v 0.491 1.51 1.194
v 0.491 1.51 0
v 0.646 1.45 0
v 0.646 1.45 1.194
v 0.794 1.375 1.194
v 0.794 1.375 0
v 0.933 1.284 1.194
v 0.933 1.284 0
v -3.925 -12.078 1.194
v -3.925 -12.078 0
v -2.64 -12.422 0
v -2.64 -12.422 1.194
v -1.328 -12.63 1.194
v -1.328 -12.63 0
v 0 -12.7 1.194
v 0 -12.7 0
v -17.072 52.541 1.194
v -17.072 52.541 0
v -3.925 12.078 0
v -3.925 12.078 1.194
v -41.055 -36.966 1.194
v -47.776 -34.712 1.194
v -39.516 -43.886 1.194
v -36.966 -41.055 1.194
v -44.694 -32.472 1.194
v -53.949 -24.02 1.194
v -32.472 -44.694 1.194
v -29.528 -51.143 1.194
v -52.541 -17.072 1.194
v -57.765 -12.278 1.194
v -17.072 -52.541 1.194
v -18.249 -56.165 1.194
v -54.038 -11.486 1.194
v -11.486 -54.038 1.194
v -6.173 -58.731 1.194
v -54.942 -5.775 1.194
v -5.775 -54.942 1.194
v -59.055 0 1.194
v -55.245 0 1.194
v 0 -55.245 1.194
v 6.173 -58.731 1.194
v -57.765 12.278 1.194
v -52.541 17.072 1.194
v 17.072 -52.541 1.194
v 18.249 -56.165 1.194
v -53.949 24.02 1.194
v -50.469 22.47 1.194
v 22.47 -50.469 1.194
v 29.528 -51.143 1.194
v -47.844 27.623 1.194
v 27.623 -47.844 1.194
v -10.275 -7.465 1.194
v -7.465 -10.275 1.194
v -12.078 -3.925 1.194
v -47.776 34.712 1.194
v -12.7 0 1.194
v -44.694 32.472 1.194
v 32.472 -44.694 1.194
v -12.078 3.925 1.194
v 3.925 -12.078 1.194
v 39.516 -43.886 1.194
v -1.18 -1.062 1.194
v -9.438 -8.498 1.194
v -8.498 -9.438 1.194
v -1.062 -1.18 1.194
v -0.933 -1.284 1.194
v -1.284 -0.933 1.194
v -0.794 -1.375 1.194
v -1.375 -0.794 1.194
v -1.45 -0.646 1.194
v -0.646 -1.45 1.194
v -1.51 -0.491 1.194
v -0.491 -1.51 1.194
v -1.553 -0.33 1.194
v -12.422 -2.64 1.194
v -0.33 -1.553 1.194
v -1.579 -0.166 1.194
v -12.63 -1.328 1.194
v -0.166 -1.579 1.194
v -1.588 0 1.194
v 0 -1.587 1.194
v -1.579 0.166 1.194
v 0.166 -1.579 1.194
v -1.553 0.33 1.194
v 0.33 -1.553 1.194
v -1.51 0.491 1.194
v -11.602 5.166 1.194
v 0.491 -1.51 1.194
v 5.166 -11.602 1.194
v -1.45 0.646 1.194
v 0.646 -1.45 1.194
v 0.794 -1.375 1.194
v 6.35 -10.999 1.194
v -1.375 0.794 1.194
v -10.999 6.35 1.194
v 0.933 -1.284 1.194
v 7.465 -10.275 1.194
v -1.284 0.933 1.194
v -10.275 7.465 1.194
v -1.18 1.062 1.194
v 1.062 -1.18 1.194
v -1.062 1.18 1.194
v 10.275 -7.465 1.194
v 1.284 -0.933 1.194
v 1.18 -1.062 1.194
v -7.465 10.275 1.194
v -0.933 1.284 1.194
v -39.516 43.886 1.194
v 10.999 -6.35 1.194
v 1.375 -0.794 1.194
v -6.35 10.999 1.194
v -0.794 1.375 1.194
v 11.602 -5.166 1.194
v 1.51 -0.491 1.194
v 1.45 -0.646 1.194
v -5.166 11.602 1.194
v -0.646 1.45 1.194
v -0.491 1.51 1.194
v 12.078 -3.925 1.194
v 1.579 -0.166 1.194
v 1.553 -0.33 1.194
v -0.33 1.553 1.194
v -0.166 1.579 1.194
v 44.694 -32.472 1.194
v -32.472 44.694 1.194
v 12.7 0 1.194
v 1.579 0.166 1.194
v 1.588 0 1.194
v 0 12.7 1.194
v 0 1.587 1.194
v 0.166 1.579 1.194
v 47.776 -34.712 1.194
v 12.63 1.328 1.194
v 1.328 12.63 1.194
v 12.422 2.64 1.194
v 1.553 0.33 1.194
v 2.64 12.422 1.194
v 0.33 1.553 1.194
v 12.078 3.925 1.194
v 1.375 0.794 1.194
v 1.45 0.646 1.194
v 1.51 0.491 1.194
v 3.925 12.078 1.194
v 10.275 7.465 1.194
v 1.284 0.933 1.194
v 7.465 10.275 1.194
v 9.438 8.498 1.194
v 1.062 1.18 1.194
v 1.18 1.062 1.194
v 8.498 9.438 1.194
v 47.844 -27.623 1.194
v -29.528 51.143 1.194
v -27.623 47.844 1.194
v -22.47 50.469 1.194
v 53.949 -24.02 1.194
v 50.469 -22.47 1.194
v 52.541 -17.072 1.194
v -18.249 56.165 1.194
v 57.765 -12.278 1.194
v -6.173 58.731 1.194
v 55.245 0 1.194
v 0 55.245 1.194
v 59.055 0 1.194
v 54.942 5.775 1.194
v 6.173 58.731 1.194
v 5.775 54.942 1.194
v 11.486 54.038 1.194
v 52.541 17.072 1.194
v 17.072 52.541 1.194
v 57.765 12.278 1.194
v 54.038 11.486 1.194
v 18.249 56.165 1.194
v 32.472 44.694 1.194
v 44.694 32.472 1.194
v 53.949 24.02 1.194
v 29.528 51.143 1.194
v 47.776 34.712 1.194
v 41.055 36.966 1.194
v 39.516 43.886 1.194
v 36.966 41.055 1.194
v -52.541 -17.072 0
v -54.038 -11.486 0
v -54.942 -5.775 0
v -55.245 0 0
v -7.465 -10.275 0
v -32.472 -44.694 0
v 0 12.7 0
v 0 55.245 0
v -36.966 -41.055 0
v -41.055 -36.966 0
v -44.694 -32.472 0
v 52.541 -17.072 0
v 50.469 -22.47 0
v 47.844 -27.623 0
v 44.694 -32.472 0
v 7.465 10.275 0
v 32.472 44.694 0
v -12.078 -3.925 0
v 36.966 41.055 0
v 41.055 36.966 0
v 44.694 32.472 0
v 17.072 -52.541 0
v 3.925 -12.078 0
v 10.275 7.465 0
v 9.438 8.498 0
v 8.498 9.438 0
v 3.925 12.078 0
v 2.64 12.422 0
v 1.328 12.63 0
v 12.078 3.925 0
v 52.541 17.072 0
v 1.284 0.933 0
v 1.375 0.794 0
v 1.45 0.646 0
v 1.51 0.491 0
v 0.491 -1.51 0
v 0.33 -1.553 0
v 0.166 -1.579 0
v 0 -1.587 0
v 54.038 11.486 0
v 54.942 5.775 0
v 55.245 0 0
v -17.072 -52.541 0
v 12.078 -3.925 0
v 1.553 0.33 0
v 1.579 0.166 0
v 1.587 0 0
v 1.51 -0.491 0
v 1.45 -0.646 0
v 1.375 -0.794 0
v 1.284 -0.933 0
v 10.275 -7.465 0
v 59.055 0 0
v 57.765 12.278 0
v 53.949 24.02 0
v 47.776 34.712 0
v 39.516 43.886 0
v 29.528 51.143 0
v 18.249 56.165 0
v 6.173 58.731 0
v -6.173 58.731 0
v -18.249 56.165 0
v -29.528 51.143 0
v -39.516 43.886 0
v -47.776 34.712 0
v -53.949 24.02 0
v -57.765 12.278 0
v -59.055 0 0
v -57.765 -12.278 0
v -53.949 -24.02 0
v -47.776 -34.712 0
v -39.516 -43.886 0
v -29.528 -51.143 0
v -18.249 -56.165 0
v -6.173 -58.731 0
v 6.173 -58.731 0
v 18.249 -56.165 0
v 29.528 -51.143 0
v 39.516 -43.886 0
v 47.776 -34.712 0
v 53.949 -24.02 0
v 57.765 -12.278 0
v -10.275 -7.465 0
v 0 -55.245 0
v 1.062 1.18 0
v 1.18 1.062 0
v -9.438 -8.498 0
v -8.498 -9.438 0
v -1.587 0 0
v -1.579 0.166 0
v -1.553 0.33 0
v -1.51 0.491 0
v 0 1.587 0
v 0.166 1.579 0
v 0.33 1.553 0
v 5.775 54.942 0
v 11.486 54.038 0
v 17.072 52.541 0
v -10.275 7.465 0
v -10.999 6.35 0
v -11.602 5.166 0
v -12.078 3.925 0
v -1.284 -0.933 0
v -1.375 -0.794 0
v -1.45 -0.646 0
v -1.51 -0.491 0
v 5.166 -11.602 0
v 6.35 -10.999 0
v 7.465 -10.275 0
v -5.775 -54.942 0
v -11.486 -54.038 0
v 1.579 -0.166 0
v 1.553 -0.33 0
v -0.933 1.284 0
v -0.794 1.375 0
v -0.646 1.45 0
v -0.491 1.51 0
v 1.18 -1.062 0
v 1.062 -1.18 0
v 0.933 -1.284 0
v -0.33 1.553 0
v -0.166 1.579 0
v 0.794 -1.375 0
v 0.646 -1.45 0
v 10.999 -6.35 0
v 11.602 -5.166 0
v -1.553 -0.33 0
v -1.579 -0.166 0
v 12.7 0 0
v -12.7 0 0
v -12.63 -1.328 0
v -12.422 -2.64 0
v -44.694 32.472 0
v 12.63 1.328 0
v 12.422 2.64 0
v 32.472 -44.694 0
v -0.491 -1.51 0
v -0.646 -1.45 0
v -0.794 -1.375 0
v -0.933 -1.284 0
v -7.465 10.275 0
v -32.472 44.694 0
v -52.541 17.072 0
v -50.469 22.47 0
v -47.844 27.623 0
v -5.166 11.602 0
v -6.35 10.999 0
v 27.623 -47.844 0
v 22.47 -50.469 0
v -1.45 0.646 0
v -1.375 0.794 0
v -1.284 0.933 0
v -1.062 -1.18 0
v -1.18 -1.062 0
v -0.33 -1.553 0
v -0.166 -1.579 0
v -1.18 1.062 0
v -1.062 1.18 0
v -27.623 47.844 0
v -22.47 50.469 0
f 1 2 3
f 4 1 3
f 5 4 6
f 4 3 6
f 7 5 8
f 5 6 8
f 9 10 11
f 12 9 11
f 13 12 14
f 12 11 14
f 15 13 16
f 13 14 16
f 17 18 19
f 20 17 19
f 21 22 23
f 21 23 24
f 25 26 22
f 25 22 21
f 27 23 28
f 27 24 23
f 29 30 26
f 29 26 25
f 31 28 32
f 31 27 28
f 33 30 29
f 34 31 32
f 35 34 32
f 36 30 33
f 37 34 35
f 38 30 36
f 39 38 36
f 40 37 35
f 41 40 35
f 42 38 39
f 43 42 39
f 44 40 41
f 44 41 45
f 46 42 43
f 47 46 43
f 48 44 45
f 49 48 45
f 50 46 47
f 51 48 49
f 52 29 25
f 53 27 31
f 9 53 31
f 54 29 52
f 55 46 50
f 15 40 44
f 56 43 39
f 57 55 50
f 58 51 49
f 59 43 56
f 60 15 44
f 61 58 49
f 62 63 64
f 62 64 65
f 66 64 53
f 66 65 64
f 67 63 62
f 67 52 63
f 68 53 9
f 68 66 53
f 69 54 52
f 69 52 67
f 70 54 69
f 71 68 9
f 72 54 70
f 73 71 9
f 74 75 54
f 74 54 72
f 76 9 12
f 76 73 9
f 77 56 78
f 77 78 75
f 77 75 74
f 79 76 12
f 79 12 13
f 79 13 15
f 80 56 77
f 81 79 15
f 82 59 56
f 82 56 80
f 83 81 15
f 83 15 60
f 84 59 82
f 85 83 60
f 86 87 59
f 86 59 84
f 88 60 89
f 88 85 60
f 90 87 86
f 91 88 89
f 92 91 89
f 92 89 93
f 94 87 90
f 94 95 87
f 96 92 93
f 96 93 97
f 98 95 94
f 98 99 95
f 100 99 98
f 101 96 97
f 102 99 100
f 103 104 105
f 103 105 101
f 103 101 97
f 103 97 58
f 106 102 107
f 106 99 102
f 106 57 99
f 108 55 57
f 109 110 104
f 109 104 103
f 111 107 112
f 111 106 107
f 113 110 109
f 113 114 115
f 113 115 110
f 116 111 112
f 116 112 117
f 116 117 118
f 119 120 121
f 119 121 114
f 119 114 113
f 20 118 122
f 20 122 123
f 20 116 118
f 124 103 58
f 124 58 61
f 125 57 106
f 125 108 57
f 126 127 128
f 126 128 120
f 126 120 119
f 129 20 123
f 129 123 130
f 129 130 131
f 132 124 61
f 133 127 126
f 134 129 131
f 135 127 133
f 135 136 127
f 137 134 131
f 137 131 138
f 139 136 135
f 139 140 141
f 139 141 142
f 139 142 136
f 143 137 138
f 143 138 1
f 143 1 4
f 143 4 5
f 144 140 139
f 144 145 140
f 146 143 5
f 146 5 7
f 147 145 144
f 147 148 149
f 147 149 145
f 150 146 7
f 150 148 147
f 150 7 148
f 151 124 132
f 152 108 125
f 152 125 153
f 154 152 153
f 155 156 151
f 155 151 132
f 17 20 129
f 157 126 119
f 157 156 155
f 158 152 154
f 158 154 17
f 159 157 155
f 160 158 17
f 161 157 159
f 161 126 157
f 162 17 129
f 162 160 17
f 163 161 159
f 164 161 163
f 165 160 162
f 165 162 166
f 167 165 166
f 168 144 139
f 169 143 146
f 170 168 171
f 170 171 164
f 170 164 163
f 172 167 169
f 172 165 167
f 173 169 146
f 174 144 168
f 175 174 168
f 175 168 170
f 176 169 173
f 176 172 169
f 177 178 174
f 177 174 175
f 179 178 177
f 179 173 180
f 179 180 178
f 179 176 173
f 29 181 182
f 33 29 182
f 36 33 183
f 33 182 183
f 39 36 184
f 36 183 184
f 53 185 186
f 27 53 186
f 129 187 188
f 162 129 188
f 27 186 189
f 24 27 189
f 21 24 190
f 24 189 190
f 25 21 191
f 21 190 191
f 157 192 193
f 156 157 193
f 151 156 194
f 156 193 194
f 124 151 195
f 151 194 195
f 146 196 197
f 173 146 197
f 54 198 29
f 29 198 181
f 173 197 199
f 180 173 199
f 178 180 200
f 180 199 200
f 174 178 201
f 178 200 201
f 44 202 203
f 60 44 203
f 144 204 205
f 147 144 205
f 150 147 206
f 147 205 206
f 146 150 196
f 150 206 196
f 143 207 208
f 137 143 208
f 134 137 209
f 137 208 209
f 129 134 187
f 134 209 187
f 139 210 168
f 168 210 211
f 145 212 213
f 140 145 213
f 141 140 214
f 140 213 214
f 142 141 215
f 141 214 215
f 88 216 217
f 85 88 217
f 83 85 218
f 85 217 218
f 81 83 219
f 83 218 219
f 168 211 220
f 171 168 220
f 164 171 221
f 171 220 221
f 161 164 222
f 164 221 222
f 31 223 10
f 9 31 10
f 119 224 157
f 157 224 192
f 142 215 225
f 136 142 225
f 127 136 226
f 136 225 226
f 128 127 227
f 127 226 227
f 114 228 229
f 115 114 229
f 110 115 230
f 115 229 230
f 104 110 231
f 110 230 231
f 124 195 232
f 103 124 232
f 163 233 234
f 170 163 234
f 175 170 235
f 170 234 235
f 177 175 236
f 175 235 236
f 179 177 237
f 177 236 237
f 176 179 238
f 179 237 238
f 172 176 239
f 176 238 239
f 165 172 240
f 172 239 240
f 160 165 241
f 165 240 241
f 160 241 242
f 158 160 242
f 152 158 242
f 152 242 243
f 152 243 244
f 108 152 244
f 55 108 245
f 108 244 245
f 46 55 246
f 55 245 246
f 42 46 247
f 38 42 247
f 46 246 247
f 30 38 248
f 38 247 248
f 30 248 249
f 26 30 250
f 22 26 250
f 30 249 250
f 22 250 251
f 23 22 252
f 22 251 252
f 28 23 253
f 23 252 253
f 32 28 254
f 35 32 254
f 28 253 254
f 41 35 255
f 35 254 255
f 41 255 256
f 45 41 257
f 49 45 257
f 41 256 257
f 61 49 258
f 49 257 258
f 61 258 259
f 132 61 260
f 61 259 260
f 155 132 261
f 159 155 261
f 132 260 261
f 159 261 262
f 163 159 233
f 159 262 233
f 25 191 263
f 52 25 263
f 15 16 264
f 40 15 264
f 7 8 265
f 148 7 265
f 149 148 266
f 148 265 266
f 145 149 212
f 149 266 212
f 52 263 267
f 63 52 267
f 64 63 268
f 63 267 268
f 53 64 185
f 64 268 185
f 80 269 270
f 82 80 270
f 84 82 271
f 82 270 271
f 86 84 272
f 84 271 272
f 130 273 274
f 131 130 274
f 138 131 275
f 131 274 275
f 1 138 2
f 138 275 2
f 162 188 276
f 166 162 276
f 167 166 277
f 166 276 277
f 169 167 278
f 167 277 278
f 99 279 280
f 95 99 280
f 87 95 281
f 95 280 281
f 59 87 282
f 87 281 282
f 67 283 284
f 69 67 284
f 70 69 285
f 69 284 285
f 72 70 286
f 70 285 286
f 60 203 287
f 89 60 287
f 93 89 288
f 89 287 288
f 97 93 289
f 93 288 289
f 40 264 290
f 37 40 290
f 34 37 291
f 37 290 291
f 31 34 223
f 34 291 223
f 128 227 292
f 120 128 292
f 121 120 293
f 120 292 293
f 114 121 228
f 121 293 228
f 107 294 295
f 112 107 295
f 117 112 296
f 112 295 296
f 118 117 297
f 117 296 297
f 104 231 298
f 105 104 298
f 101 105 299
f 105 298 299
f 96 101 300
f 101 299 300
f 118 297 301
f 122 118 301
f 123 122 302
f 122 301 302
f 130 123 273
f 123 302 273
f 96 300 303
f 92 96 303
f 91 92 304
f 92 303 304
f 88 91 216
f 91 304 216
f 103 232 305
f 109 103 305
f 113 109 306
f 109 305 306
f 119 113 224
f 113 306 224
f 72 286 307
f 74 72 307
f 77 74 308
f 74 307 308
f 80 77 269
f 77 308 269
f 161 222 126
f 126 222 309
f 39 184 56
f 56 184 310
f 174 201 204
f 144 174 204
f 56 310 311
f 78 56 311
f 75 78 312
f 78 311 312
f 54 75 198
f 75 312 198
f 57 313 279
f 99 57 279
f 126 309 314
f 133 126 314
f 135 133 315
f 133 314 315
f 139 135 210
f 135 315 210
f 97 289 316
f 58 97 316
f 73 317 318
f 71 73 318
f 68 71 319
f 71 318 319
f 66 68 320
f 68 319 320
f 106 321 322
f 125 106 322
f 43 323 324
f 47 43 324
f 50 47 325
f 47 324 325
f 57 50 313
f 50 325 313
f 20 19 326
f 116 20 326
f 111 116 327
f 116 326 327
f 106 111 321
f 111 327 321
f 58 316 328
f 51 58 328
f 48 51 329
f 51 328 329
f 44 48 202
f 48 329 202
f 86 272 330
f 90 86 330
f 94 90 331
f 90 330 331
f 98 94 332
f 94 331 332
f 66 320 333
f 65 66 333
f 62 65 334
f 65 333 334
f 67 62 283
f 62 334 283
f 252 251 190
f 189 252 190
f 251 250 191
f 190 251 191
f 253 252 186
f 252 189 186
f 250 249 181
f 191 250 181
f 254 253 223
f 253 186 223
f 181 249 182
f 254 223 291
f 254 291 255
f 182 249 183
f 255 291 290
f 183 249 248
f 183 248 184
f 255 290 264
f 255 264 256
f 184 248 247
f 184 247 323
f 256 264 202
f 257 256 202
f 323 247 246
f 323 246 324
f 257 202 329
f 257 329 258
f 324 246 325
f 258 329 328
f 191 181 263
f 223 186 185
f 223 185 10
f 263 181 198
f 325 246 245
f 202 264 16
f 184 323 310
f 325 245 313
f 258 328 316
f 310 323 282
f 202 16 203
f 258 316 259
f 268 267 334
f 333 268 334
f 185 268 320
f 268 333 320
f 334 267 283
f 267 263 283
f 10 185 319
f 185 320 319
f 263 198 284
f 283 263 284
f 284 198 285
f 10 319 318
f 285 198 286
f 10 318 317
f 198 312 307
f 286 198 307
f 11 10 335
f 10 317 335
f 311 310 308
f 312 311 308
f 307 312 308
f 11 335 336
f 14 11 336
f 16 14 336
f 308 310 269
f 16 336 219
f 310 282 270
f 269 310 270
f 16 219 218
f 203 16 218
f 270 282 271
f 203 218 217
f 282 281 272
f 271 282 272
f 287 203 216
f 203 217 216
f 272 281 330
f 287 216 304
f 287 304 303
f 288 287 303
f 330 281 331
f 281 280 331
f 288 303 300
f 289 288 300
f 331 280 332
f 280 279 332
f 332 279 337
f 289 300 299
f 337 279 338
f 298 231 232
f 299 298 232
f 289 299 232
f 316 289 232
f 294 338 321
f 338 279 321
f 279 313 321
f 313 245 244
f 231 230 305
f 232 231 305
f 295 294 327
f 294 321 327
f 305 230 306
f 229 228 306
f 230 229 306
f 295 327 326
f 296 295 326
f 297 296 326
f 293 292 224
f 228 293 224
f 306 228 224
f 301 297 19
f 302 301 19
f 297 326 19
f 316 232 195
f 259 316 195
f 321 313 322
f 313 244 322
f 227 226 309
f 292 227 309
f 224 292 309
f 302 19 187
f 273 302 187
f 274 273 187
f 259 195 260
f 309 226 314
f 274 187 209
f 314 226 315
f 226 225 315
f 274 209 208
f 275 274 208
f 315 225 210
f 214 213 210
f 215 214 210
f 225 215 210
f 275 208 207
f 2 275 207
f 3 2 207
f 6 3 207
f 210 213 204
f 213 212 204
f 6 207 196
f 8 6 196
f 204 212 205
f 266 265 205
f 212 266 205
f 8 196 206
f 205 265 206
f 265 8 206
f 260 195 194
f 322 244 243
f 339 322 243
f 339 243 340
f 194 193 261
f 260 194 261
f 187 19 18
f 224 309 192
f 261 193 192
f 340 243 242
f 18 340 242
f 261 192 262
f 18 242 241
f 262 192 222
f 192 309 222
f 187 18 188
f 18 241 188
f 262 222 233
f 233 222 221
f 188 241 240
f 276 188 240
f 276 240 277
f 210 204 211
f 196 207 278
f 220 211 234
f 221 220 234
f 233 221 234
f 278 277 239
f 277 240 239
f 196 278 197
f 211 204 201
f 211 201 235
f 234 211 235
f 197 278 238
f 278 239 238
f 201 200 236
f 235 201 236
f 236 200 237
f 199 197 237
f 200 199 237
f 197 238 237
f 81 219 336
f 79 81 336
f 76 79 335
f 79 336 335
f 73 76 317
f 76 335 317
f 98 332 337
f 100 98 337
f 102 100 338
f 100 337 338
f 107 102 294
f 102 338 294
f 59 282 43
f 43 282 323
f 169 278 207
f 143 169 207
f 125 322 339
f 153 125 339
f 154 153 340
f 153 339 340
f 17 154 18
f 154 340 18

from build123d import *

# Parameters (mm, degrees)
F0_R     = 59.055
F1_DEPTH = 1.1938
F2_DEPTH = 1.1938


with BuildPart() as f1:
    # F0 (on Top) → F1 (new body)
    with BuildSketch(Plane.XY):
        Circle(F0_R)
        with BuildLine():
            ThreePointArc((52.5411172427, 17.0716438542), (54.5648423762, 8.6422220211), (55.245, 0))
            ThreePointArc((55.245, 0), (54.5648423762, -8.6422220211), (52.5411172427, -17.0716438542))
            ThreePointArc((52.5411172427, -17.0716438542), (49.2236554288, -25.0807051581), (44.6941438542, -32.4721962629))
            ThreePointArc((44.6941438542, -32.4721962629), (39.0641141267, -39.0641141267), (32.4721962629, -44.6941438542))
            ThreePointArc((32.4721962629, -44.6941438542), (25.0807051581, -49.2236554288), (17.0716438542, -52.5411172427))
            ThreePointArc((17.0716438542, -52.5411172427), (8.6422220211, -54.5648423762), (0, -55.245))
            ThreePointArc((0, -55.245), (-8.6422220211, -54.5648423762), (-17.0716438542, -52.5411172427))
            ThreePointArc((-17.0716438542, -52.5411172427), (-25.0807051581, -49.2236554288), (-32.4721962629, -44.6941438542))
            ThreePointArc((-32.4721962629, -44.6941438542), (-39.0641141267, -39.0641141267), (-44.6941438542, -32.4721962629))
            ThreePointArc((-44.6941438542, -32.4721962629), (-49.2236554288, -25.0807051581), (-52.5411172427, -17.0716438542))
            ThreePointArc((-52.5411172427, -17.0716438542), (-54.5648423762, -8.6422220211), (-55.245, 0))
            ThreePointArc((-55.245, 0), (-54.5648423762, 8.6422220211), (-52.5411172427, 17.0716438542))
            ThreePointArc((-52.5411172427, 17.0716438542), (-49.2236554288, 25.0807051581), (-44.6941438542, 32.4721962629))
            ThreePointArc((-44.6941438542, 32.4721962629), (-39.0641141267, 39.0641141267), (-32.4721962629, 44.6941438542))
            ThreePointArc((-32.4721962629, 44.6941438542), (-25.0807051581, 49.2236554288), (-17.0716438542, 52.5411172427))
            ThreePointArc((-17.0716438542, 52.5411172427), (-8.6422220211, 54.5648423762), (0, 55.245))
            ThreePointArc((0, 55.245), (8.6422220211, 54.5648423762), (17.0716438542, 52.5411172427))
            ThreePointArc((17.0716438542, 52.5411172427), (25.0807051581, 49.2236554288), (32.4721962629, 44.6941438542))
            ThreePointArc((32.4721962629, 44.6941438542), (39.0641141267, 39.0641141267), (44.6941438542, 32.4721962629))
            ThreePointArc((44.6941438542, 32.4721962629), (49.2236554288, 25.0807051581), (52.5411172427, 17.0716438542))
        make_face(mode=Mode.SUBTRACT)
        with BuildLine():
            ThreePointArc((0, -55.245), (8.6422220211, -54.5648423762), (17.0716438542, -52.5411172427))
            Line((17.0716438542, -52.5411172427), (3.9245158286, -12.0784177569))
            ThreePointArc((3.9245158286, -12.0784177569), (1.986717706, -12.5436419256), (0, -12.7))
            Line((0, -12.7), (0, -55.245))
        make_face()
        with BuildLine():
            ThreePointArc((-3.9245158286, -12.0784177569), (-5.7656793467, -11.3157828572), (-7.4648727041, -10.2745158286))
            Line((-7.4648727041, -10.2745158286), (-32.4721962629, -44.6941438542))
            ThreePointArc((-32.4721962629, -44.6941438542), (-25.0807051581, -49.2236554288), (-17.0716438542, -52.5411172427))
            Line((-17.0716438542, -52.5411172427), (-3.9245158286, -12.0784177569))
        make_face()
        with BuildLine():
            ThreePointArc((-10.2745158286, -7.4648727041), (-11.3157828572, -5.7656793467), (-12.0784177569, -3.9245158286))
            Line((-12.0784177569, -3.9245158286), (-52.5411172427, -17.0716438542))
            ThreePointArc((-52.5411172427, -17.0716438542), (-49.2236554288, -25.0807051581), (-44.6941438542, -32.4721962629))
            Line((-44.6941438542, -32.4721962629), (-10.2745158286, -7.4648727041))
        make_face()
        with BuildLine():
            ThreePointArc((-12.7, 0), (-12.5436419256, 1.986717706), (-12.0784177569, 3.9245158286))
            Line((-12.0784177569, 3.9245158286), (-52.5411172427, 17.0716438542))
            ThreePointArc((-52.5411172427, 17.0716438542), (-54.5648423762, 8.6422220211), (-55.245, 0))
            Line((-55.245, 0), (-12.7, 0))
        make_face()
        with BuildLine():
            ThreePointArc((-10.2745158286, 7.4648727041), (-8.9802561211, 8.9802561211), (-7.4648727041, 10.2745158286))
            Line((-7.4648727041, 10.2745158286), (-32.4721962629, 44.6941438542))
            ThreePointArc((-32.4721962629, 44.6941438542), (-39.0641141267, 39.0641141267), (-44.6941438542, 32.4721962629))
            Line((-44.6941438542, 32.4721962629), (-10.2745158286, 7.4648727041))
        make_face()
        with BuildLine():
            Line((0, 12.7), (0, 55.245))
            ThreePointArc((0, 55.245), (-8.6422220211, 54.5648423762), (-17.0716438542, 52.5411172427))
            Line((-17.0716438542, 52.5411172427), (-3.9245158286, 12.0784177569))
            ThreePointArc((-3.9245158286, 12.0784177569), (-1.986717706, 12.5436419256), (0, 12.7))
        make_face()
        with BuildLine():
            Line((7.4648727041, 10.2745158286), (32.4721962629, 44.6941438542))
            ThreePointArc((32.4721962629, 44.6941438542), (25.0807051581, 49.2236554288), (17.0716438542, 52.5411172427))
            Line((17.0716438542, 52.5411172427), (3.9245158286, 12.0784177569))
            ThreePointArc((3.9245158286, 12.0784177569), (5.7656793467, 11.3157828572), (7.4648727041, 10.2745158286))
        make_face()
        with BuildLine():
            Line((12.0784177569, 3.9245158286), (52.5411172427, 17.0716438542))
            ThreePointArc((52.5411172427, 17.0716438542), (49.2236554288, 25.0807051581), (44.6941438542, 32.4721962629))
            Line((44.6941438542, 32.4721962629), (10.2745158286, 7.4648727041))
            ThreePointArc((10.2745158286, 7.4648727041), (11.3157828572, 5.7656793467), (12.0784177569, 3.9245158286))
        make_face()
        with BuildLine():
            ThreePointArc((52.5411172427, -17.0716438542), (54.5648423762, -8.6422220211), (55.245, 0))
            Line((55.245, 0), (12.7, 0))
            ThreePointArc((12.7, 0), (12.5436419256, -1.986717706), (12.0784177569, -3.9245158286))
            Line((12.0784177569, -3.9245158286), (52.5411172427, -17.0716438542))
        make_face()
        with BuildLine():
            ThreePointArc((32.4721962629, -44.6941438542), (39.0641141267, -39.0641141267), (44.6941438542, -32.4721962629))
            Line((44.6941438542, -32.4721962629), (10.2745158286, -7.4648727041))
            ThreePointArc((10.2745158286, -7.4648727041), (8.9802561211, -8.9802561211), (7.4648727041, -10.2745158286))
            Line((7.4648727041, -10.2745158286), (32.4721962629, -44.6941438542))
        make_face()
        with BuildLine():
            Line((0, 12.7), (0, 1.5875))
            ThreePointArc((0, 1.5875), (0.2483397133, 1.5679552407), (0.4905644786, 1.5098022196))
            Line((0.4905644786, 1.5098022196), (3.9245158286, 12.0784177569))
            ThreePointArc((3.9245158286, 12.0784177569), (1.986717706, 12.5436419256), (0, 12.7))
        make_face()
        with BuildLine():
            ThreePointArc((-0.4905644786, 1.5098022196), (-0.2483397133, 1.5679552407), (0, 1.5875))
            Line((0, 1.5875), (0, 12.7))
            ThreePointArc((0, 12.7), (-1.986717706, 12.5436419256), (-3.9245158286, 12.0784177569))
            Line((-3.9245158286, 12.0784177569), (-0.4905644786, 1.5098022196))
        make_face()
        with BuildLine():
            ThreePointArc((-0.933109088, 1.2843144786), (-0.7207099183, 1.4144728571), (-0.4905644786, 1.5098022196))
            Line((-0.4905644786, 1.5098022196), (-3.9245158286, 12.0784177569))
            ThreePointArc((-3.9245158286, 12.0784177569), (-5.7656793467, 11.3157828572), (-7.4648727041, 10.2745158286))
            Line((-7.4648727041, 10.2745158286), (-0.933109088, 1.2843144786))
        make_face()
        with BuildLine():
            ThreePointArc((-1.2843144786, 0.933109088), (-1.1225320151, 1.1225320151), (-0.933109088, 1.2843144786))
            Line((-0.933109088, 1.2843144786), (-7.4648727041, 10.2745158286))
            ThreePointArc((-7.4648727041, 10.2745158286), (-8.9802561211, 8.9802561211), (-10.2745158286, 7.4648727041))
            Line((-10.2745158286, 7.4648727041), (-1.2843144786, 0.933109088))
        make_face()
        with BuildLine():
            ThreePointArc((-1.5098022196, 0.4905644786), (-1.4144728571, 0.7207099183), (-1.2843144786, 0.933109088))
            Line((-1.2843144786, 0.933109088), (-10.2745158286, 7.4648727041))
            ThreePointArc((-10.2745158286, 7.4648727041), (-11.3157828572, 5.7656793467), (-12.0784177569, 3.9245158286))
            Line((-12.0784177569, 3.9245158286), (-1.5098022196, 0.4905644786))
        make_face()
        with BuildLine():
            ThreePointArc((-1.5875, 0), (-1.5679552407, 0.2483397133), (-1.5098022196, 0.4905644786))
            Line((-1.5098022196, 0.4905644786), (-12.0784177569, 3.9245158286))
            ThreePointArc((-12.0784177569, 3.9245158286), (-12.5436419256, 1.986717706), (-12.7, 0))
            Line((-12.7, 0), (-1.5875, 0))
        make_face()
        with BuildLine():
            ThreePointArc((-1.5098022196, -0.4905644786), (-1.5679552407, -0.2483397133), (-1.5875, 0))
            Line((-1.5875, 0), (-12.7, 0))
            ThreePointArc((-12.7, 0), (-12.5436419256, -1.986717706), (-12.0784177569, -3.9245158286))
            Line((-12.0784177569, -3.9245158286), (-1.5098022196, -0.4905644786))
        make_face()
        with BuildLine():
            ThreePointArc((-1.2843144786, -0.933109088), (-1.4144728571, -0.7207099183), (-1.5098022196, -0.4905644786))
            Line((-1.5098022196, -0.4905644786), (-12.0784177569, -3.9245158286))
            ThreePointArc((-12.0784177569, -3.9245158286), (-11.3157828572, -5.7656793467), (-10.2745158286, -7.4648727041))
            Line((-10.2745158286, -7.4648727041), (-1.2843144786, -0.933109088))
        make_face()
        with BuildLine():
            ThreePointArc((-0.933109088, -1.2843144786), (-1.1225320151, -1.1225320151), (-1.2843144786, -0.933109088))
            Line((-1.2843144786, -0.933109088), (-10.2745158286, -7.4648727041))
            ThreePointArc((-10.2745158286, -7.4648727041), (-8.9802561211, -8.9802561211), (-7.4648727041, -10.2745158286))
            Line((-7.4648727041, -10.2745158286), (-0.933109088, -1.2843144786))
        make_face()
        with BuildLine():
            ThreePointArc((-0.4905644786, -1.5098022196), (-0.7207099183, -1.4144728571), (-0.933109088, -1.2843144786))
            Line((-0.933109088, -1.2843144786), (-7.4648727041, -10.2745158286))
            ThreePointArc((-7.4648727041, -10.2745158286), (-5.7656793467, -11.3157828572), (-3.9245158286, -12.0784177569))
            Line((-3.9245158286, -12.0784177569), (-0.4905644786, -1.5098022196))
        make_face()
        with BuildLine():
            ThreePointArc((0, -1.5875), (-0.2483397133, -1.5679552407), (-0.4905644786, -1.5098022196))
            Line((-0.4905644786, -1.5098022196), (-3.9245158286, -12.0784177569))
            ThreePointArc((-3.9245158286, -12.0784177569), (-1.986717706, -12.5436419256), (0, -12.7))
            Line((0, -12.7), (0, -1.5875))
        make_face()
        with BuildLine():
            ThreePointArc((0.4905644786, -1.5098022196), (0.2483397133, -1.5679552407), (0, -1.5875))
            Line((0, -1.5875), (0, -12.7))
            ThreePointArc((0, -12.7), (1.986717706, -12.5436419256), (3.9245158286, -12.0784177569))
            Line((3.9245158286, -12.0784177569), (0.4905644786, -1.5098022196))
        make_face()
        with BuildLine():
            ThreePointArc((3.9245158286, -12.0784177569), (5.7656793467, -11.3157828572), (7.4648727041, -10.2745158286))
            Line((7.4648727041, -10.2745158286), (0.933109088, -1.2843144786))
            ThreePointArc((0.933109088, -1.2843144786), (0.7207099183, -1.4144728571), (0.4905644786, -1.5098022196))
            Line((0.4905644786, -1.5098022196), (3.9245158286, -12.0784177569))
        make_face()
        with BuildLine():
            ThreePointArc((7.4648727041, -10.2745158286), (8.9802561211, -8.9802561211), (10.2745158286, -7.4648727041))
            Line((10.2745158286, -7.4648727041), (1.2843144786, -0.933109088))
            ThreePointArc((1.2843144786, -0.933109088), (1.1225320151, -1.1225320151), (0.933109088, -1.2843144786))
            Line((0.933109088, -1.2843144786), (7.4648727041, -10.2745158286))
        make_face()
        with BuildLine():
            ThreePointArc((10.2745158286, -7.4648727041), (11.3157828572, -5.7656793467), (12.0784177569, -3.9245158286))
            Line((12.0784177569, -3.9245158286), (1.5098022196, -0.4905644786))
            ThreePointArc((1.5098022196, -0.4905644786), (1.4144728571, -0.7207099183), (1.2843144786, -0.933109088))
            Line((1.2843144786, -0.933109088), (10.2745158286, -7.4648727041))
        make_face()
        with BuildLine():
            ThreePointArc((12.0784177569, -3.9245158286), (12.5436419256, -1.986717706), (12.7, 0))
            Line((12.7, 0), (1.5875, 0))
            ThreePointArc((1.5875, 0), (1.5679552407, -0.2483397133), (1.5098022196, -0.4905644786))
            Line((1.5098022196, -0.4905644786), (12.0784177569, -3.9245158286))
        make_face()
        with BuildLine():
            Line((1.5875, 0), (12.7, 0))
            ThreePointArc((12.7, 0), (12.5436419256, 1.986717706), (12.0784177569, 3.9245158286))
            Line((12.0784177569, 3.9245158286), (1.5098022196, 0.4905644786))
            ThreePointArc((1.5098022196, 0.4905644786), (1.5679552407, 0.2483397133), (1.5875, 0))
        make_face()
        with BuildLine():
            Line((1.5098022196, 0.4905644786), (12.0784177569, 3.9245158286))
            ThreePointArc((12.0784177569, 3.9245158286), (11.3157828572, 5.7656793467), (10.2745158286, 7.4648727041))
            Line((10.2745158286, 7.4648727041), (1.2843144786, 0.933109088))
            ThreePointArc((1.2843144786, 0.933109088), (1.4144728571, 0.7207099183), (1.5098022196, 0.4905644786))
        make_face()
        with BuildLine():
            Line((1.2843144786, 0.933109088), (10.2745158286, 7.4648727041))
            ThreePointArc((10.2745158286, 7.4648727041), (8.9802561211, 8.9802561211), (7.4648727041, 10.2745158286))
            Line((7.4648727041, 10.2745158286), (0.933109088, 1.2843144786))
            ThreePointArc((0.933109088, 1.2843144786), (1.1225320151, 1.1225320151), (1.2843144786, 0.933109088))
        make_face()
        with BuildLine():
            Line((0.933109088, 1.2843144786), (7.4648727041, 10.2745158286))
            ThreePointArc((7.4648727041, 10.2745158286), (5.7656793467, 11.3157828572), (3.9245158286, 12.0784177569))
            Line((3.9245158286, 12.0784177569), (0.4905644786, 1.5098022196))
            ThreePointArc((0.4905644786, 1.5098022196), (0.7207099183, 1.4144728571), (0.933109088, 1.2843144786))
        make_face()
    extrude(amount=F1_DEPTH)

    # F0 (on Top) → F2 (cut)
    with BuildSketch(Plane.XY):
        with BuildLine():
            Line((-0.933109088, -1.2843144786), (0, 0))
            Line((0, 0), (-1.2843144786, -0.933109088))
            ThreePointArc((-1.2843144786, -0.933109088), (-1.1225320151, -1.1225320151), (-0.933109088, -1.2843144786))
        make_face()
        with BuildLine():
            Line((-1.2843144786, -0.933109088), (0, 0))
            Line((0, 0), (-1.5098022196, -0.4905644786))
            ThreePointArc((-1.5098022196, -0.4905644786), (-1.4144728571, -0.7207099183), (-1.2843144786, -0.933109088))
        make_face()
        with BuildLine():
            Line((-1.5098022196, -0.4905644786), (0, 0))
            Line((0, 0), (-1.5875, 0))
            ThreePointArc((-1.5875, 0), (-1.5679552407, -0.2483397133), (-1.5098022196, -0.4905644786))
        make_face()
        with BuildLine():
            Line((-1.5875, 0), (0, 0))
            Line((0, 0), (-1.5098022196, 0.4905644786))
            ThreePointArc((-1.5098022196, 0.4905644786), (-1.5679552407, 0.2483397133), (-1.5875, 0))
        make_face()
        with BuildLine():
            Line((-1.5098022196, 0.4905644786), (0, 0))
            Line((0, 0), (-1.2843144786, 0.933109088))
            ThreePointArc((-1.2843144786, 0.933109088), (-1.4144728571, 0.7207099183), (-1.5098022196, 0.4905644786))
        make_face()
        with BuildLine():
            Line((-1.2843144786, 0.933109088), (0, 0))
            Line((0, 0), (-0.933109088, 1.2843144786))
            ThreePointArc((-0.933109088, 1.2843144786), (-1.1225320151, 1.1225320151), (-1.2843144786, 0.933109088))
        make_face()
        with BuildLine():
            Line((-0.933109088, 1.2843144786), (0, 0))
            Line((0, 0), (-0.4905644786, 1.5098022196))
            ThreePointArc((-0.4905644786, 1.5098022196), (-0.7207099183, 1.4144728571), (-0.933109088, 1.2843144786))
        make_face()
        with BuildLine():
            Line((-0.4905644786, 1.5098022196), (0, 0))
            Line((0, 0), (0, 1.5875))
            ThreePointArc((0, 1.5875), (-0.2483397133, 1.5679552407), (-0.4905644786, 1.5098022196))
        make_face()
        with BuildLine():
            Line((0, 1.5875), (0, 0))
            Line((0, 0), (0.4905644786, 1.5098022196))
            ThreePointArc((0.4905644786, 1.5098022196), (0.2483397133, 1.5679552407), (0, 1.5875))
        make_face()
        with BuildLine():
            Line((0.4905644786, 1.5098022196), (0, 0))
            Line((0, 0), (0.933109088, 1.2843144786))
            ThreePointArc((0.933109088, 1.2843144786), (0.7207099183, 1.4144728571), (0.4905644786, 1.5098022196))
        make_face()
        with BuildLine():
            Line((0.933109088, 1.2843144786), (0, 0))
            Line((0, 0), (1.2843144786, 0.933109088))
            ThreePointArc((1.2843144786, 0.933109088), (1.1225320151, 1.1225320151), (0.933109088, 1.2843144786))
        make_face()
        with BuildLine():
            Line((0, 0), (1.5098022196, 0.4905644786))
            ThreePointArc((1.5098022196, 0.4905644786), (1.4144728571, 0.7207099183), (1.2843144786, 0.933109088))
            Line((1.2843144786, 0.933109088), (0, 0))
        make_face()
        with BuildLine():
            Line((0, 0), (1.5875, 0))
            ThreePointArc((1.5875, 0), (1.5679552407, 0.2483397133), (1.5098022196, 0.4905644786))
            Line((1.5098022196, 0.4905644786), (0, 0))
        make_face()
        with BuildLine():
            ThreePointArc((1.5098022196, -0.4905644786), (1.5679552407, -0.2483397133), (1.5875, 0))
            Line((1.5875, 0), (0, 0))
            Line((0, 0), (1.5098022196, -0.4905644786))
        make_face()
        with BuildLine():
            ThreePointArc((1.2843144786, -0.933109088), (1.4144728571, -0.7207099183), (1.5098022196, -0.4905644786))
            Line((1.5098022196, -0.4905644786), (0, 0))
            Line((0, 0), (1.2843144786, -0.933109088))
        make_face()
        with BuildLine():
            Line((1.2843144786, -0.933109088), (0, 0))
            Line((0, 0), (0.933109088, -1.2843144786))
            ThreePointArc((0.933109088, -1.2843144786), (1.1225320151, -1.1225320151), (1.2843144786, -0.933109088))
        make_face()
        with BuildLine():
            Line((0.933109088, -1.2843144786), (0, 0))
            Line((0, 0), (0.4905644786, -1.5098022196))
            ThreePointArc((0.4905644786, -1.5098022196), (0.7207099183, -1.4144728571), (0.933109088, -1.2843144786))
        make_face()
        with BuildLine():
            Line((0.4905644786, -1.5098022196), (0, 0))
            Line((0, 0), (0, -1.5875))
            ThreePointArc((0, -1.5875), (0.2483397133, -1.5679552407), (0.4905644786, -1.5098022196))
        make_face()
        with BuildLine():
            Line((0, -1.5875), (0, 0))
            Line((0, 0), (-0.4905644786, -1.5098022196))
            ThreePointArc((-0.4905644786, -1.5098022196), (-0.2483397133, -1.5679552407), (0, -1.5875))
        make_face()
        with BuildLine():
            Line((-0.4905644786, -1.5098022196), (0, 0))
            Line((0, 0), (-0.933109088, -1.2843144786))
            ThreePointArc((-0.933109088, -1.2843144786), (-0.7207099183, -1.4144728571), (-0.4905644786, -1.5098022196))
        make_face()
    extrude(amount=-F2_DEPTH, mode=Mode.SUBTRACT)


solid = f1.part
